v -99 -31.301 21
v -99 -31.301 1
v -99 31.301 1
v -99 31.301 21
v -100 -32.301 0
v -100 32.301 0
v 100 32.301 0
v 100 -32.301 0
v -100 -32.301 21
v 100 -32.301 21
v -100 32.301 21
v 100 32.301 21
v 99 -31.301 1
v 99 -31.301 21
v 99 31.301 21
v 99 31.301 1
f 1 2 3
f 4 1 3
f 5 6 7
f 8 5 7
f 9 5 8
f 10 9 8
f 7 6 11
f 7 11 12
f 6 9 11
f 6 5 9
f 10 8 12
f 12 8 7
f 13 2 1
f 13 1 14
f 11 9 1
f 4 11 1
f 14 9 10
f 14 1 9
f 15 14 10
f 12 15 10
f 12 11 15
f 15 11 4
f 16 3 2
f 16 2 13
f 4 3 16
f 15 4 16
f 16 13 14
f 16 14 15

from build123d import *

# Parameters (mm, degrees)
F0_W     = 200
F0_H     = 64.601768
F1_DEPTH = 1
F2_W     = 1
F2_H     = 64.601768
F3_DEPTH = 20
F4_W     = 199
F4_H     = 1
F5_DEPTH = 20
F6_W     = 199
F6_H     = 1
F7_DEPTH = 20
F8_W     = 1
F8_H     = 62.601768
F9_DEPTH = 20


with BuildPart() as f1:
    # F0 (on Top) → F1 (new body)
    with BuildSketch(Plane.XY):
        Rectangle(F0_W, F0_H)
    extrude(amount=F1_DEPTH)

    # F2 (on face) → F3 (join)
    with BuildSketch(Plane.XY.offset(1)):
        with Locations((-99.5, 0)):
            Rectangle(F2_W, F2_H)
    extrude(amount=F3_DEPTH)

    # F4 (on face) → F5 (join)
    with BuildSketch(Plane.XY.offset(1)):
        with Locations((0.5, 31.800884)):
            Rectangle(F4_W, F4_H)
    extrude(amount=F5_DEPTH)

    # F6 (on face) → F7 (join)
    with BuildSketch(Plane.XY.offset(1)):
        with Locations((0.5, -31.800884)):
            Rectangle(F6_W, F6_H)
    extrude(amount=F7_DEPTH)

    # F8 (on face) → F9 (join)
    with BuildSketch(Plane.XY.offset(1)):
        with Locations((99.5, 0)):
            Rectangle(F8_W, F8_H)
    extrude(amount=F9_DEPTH)


solid = f1.part
